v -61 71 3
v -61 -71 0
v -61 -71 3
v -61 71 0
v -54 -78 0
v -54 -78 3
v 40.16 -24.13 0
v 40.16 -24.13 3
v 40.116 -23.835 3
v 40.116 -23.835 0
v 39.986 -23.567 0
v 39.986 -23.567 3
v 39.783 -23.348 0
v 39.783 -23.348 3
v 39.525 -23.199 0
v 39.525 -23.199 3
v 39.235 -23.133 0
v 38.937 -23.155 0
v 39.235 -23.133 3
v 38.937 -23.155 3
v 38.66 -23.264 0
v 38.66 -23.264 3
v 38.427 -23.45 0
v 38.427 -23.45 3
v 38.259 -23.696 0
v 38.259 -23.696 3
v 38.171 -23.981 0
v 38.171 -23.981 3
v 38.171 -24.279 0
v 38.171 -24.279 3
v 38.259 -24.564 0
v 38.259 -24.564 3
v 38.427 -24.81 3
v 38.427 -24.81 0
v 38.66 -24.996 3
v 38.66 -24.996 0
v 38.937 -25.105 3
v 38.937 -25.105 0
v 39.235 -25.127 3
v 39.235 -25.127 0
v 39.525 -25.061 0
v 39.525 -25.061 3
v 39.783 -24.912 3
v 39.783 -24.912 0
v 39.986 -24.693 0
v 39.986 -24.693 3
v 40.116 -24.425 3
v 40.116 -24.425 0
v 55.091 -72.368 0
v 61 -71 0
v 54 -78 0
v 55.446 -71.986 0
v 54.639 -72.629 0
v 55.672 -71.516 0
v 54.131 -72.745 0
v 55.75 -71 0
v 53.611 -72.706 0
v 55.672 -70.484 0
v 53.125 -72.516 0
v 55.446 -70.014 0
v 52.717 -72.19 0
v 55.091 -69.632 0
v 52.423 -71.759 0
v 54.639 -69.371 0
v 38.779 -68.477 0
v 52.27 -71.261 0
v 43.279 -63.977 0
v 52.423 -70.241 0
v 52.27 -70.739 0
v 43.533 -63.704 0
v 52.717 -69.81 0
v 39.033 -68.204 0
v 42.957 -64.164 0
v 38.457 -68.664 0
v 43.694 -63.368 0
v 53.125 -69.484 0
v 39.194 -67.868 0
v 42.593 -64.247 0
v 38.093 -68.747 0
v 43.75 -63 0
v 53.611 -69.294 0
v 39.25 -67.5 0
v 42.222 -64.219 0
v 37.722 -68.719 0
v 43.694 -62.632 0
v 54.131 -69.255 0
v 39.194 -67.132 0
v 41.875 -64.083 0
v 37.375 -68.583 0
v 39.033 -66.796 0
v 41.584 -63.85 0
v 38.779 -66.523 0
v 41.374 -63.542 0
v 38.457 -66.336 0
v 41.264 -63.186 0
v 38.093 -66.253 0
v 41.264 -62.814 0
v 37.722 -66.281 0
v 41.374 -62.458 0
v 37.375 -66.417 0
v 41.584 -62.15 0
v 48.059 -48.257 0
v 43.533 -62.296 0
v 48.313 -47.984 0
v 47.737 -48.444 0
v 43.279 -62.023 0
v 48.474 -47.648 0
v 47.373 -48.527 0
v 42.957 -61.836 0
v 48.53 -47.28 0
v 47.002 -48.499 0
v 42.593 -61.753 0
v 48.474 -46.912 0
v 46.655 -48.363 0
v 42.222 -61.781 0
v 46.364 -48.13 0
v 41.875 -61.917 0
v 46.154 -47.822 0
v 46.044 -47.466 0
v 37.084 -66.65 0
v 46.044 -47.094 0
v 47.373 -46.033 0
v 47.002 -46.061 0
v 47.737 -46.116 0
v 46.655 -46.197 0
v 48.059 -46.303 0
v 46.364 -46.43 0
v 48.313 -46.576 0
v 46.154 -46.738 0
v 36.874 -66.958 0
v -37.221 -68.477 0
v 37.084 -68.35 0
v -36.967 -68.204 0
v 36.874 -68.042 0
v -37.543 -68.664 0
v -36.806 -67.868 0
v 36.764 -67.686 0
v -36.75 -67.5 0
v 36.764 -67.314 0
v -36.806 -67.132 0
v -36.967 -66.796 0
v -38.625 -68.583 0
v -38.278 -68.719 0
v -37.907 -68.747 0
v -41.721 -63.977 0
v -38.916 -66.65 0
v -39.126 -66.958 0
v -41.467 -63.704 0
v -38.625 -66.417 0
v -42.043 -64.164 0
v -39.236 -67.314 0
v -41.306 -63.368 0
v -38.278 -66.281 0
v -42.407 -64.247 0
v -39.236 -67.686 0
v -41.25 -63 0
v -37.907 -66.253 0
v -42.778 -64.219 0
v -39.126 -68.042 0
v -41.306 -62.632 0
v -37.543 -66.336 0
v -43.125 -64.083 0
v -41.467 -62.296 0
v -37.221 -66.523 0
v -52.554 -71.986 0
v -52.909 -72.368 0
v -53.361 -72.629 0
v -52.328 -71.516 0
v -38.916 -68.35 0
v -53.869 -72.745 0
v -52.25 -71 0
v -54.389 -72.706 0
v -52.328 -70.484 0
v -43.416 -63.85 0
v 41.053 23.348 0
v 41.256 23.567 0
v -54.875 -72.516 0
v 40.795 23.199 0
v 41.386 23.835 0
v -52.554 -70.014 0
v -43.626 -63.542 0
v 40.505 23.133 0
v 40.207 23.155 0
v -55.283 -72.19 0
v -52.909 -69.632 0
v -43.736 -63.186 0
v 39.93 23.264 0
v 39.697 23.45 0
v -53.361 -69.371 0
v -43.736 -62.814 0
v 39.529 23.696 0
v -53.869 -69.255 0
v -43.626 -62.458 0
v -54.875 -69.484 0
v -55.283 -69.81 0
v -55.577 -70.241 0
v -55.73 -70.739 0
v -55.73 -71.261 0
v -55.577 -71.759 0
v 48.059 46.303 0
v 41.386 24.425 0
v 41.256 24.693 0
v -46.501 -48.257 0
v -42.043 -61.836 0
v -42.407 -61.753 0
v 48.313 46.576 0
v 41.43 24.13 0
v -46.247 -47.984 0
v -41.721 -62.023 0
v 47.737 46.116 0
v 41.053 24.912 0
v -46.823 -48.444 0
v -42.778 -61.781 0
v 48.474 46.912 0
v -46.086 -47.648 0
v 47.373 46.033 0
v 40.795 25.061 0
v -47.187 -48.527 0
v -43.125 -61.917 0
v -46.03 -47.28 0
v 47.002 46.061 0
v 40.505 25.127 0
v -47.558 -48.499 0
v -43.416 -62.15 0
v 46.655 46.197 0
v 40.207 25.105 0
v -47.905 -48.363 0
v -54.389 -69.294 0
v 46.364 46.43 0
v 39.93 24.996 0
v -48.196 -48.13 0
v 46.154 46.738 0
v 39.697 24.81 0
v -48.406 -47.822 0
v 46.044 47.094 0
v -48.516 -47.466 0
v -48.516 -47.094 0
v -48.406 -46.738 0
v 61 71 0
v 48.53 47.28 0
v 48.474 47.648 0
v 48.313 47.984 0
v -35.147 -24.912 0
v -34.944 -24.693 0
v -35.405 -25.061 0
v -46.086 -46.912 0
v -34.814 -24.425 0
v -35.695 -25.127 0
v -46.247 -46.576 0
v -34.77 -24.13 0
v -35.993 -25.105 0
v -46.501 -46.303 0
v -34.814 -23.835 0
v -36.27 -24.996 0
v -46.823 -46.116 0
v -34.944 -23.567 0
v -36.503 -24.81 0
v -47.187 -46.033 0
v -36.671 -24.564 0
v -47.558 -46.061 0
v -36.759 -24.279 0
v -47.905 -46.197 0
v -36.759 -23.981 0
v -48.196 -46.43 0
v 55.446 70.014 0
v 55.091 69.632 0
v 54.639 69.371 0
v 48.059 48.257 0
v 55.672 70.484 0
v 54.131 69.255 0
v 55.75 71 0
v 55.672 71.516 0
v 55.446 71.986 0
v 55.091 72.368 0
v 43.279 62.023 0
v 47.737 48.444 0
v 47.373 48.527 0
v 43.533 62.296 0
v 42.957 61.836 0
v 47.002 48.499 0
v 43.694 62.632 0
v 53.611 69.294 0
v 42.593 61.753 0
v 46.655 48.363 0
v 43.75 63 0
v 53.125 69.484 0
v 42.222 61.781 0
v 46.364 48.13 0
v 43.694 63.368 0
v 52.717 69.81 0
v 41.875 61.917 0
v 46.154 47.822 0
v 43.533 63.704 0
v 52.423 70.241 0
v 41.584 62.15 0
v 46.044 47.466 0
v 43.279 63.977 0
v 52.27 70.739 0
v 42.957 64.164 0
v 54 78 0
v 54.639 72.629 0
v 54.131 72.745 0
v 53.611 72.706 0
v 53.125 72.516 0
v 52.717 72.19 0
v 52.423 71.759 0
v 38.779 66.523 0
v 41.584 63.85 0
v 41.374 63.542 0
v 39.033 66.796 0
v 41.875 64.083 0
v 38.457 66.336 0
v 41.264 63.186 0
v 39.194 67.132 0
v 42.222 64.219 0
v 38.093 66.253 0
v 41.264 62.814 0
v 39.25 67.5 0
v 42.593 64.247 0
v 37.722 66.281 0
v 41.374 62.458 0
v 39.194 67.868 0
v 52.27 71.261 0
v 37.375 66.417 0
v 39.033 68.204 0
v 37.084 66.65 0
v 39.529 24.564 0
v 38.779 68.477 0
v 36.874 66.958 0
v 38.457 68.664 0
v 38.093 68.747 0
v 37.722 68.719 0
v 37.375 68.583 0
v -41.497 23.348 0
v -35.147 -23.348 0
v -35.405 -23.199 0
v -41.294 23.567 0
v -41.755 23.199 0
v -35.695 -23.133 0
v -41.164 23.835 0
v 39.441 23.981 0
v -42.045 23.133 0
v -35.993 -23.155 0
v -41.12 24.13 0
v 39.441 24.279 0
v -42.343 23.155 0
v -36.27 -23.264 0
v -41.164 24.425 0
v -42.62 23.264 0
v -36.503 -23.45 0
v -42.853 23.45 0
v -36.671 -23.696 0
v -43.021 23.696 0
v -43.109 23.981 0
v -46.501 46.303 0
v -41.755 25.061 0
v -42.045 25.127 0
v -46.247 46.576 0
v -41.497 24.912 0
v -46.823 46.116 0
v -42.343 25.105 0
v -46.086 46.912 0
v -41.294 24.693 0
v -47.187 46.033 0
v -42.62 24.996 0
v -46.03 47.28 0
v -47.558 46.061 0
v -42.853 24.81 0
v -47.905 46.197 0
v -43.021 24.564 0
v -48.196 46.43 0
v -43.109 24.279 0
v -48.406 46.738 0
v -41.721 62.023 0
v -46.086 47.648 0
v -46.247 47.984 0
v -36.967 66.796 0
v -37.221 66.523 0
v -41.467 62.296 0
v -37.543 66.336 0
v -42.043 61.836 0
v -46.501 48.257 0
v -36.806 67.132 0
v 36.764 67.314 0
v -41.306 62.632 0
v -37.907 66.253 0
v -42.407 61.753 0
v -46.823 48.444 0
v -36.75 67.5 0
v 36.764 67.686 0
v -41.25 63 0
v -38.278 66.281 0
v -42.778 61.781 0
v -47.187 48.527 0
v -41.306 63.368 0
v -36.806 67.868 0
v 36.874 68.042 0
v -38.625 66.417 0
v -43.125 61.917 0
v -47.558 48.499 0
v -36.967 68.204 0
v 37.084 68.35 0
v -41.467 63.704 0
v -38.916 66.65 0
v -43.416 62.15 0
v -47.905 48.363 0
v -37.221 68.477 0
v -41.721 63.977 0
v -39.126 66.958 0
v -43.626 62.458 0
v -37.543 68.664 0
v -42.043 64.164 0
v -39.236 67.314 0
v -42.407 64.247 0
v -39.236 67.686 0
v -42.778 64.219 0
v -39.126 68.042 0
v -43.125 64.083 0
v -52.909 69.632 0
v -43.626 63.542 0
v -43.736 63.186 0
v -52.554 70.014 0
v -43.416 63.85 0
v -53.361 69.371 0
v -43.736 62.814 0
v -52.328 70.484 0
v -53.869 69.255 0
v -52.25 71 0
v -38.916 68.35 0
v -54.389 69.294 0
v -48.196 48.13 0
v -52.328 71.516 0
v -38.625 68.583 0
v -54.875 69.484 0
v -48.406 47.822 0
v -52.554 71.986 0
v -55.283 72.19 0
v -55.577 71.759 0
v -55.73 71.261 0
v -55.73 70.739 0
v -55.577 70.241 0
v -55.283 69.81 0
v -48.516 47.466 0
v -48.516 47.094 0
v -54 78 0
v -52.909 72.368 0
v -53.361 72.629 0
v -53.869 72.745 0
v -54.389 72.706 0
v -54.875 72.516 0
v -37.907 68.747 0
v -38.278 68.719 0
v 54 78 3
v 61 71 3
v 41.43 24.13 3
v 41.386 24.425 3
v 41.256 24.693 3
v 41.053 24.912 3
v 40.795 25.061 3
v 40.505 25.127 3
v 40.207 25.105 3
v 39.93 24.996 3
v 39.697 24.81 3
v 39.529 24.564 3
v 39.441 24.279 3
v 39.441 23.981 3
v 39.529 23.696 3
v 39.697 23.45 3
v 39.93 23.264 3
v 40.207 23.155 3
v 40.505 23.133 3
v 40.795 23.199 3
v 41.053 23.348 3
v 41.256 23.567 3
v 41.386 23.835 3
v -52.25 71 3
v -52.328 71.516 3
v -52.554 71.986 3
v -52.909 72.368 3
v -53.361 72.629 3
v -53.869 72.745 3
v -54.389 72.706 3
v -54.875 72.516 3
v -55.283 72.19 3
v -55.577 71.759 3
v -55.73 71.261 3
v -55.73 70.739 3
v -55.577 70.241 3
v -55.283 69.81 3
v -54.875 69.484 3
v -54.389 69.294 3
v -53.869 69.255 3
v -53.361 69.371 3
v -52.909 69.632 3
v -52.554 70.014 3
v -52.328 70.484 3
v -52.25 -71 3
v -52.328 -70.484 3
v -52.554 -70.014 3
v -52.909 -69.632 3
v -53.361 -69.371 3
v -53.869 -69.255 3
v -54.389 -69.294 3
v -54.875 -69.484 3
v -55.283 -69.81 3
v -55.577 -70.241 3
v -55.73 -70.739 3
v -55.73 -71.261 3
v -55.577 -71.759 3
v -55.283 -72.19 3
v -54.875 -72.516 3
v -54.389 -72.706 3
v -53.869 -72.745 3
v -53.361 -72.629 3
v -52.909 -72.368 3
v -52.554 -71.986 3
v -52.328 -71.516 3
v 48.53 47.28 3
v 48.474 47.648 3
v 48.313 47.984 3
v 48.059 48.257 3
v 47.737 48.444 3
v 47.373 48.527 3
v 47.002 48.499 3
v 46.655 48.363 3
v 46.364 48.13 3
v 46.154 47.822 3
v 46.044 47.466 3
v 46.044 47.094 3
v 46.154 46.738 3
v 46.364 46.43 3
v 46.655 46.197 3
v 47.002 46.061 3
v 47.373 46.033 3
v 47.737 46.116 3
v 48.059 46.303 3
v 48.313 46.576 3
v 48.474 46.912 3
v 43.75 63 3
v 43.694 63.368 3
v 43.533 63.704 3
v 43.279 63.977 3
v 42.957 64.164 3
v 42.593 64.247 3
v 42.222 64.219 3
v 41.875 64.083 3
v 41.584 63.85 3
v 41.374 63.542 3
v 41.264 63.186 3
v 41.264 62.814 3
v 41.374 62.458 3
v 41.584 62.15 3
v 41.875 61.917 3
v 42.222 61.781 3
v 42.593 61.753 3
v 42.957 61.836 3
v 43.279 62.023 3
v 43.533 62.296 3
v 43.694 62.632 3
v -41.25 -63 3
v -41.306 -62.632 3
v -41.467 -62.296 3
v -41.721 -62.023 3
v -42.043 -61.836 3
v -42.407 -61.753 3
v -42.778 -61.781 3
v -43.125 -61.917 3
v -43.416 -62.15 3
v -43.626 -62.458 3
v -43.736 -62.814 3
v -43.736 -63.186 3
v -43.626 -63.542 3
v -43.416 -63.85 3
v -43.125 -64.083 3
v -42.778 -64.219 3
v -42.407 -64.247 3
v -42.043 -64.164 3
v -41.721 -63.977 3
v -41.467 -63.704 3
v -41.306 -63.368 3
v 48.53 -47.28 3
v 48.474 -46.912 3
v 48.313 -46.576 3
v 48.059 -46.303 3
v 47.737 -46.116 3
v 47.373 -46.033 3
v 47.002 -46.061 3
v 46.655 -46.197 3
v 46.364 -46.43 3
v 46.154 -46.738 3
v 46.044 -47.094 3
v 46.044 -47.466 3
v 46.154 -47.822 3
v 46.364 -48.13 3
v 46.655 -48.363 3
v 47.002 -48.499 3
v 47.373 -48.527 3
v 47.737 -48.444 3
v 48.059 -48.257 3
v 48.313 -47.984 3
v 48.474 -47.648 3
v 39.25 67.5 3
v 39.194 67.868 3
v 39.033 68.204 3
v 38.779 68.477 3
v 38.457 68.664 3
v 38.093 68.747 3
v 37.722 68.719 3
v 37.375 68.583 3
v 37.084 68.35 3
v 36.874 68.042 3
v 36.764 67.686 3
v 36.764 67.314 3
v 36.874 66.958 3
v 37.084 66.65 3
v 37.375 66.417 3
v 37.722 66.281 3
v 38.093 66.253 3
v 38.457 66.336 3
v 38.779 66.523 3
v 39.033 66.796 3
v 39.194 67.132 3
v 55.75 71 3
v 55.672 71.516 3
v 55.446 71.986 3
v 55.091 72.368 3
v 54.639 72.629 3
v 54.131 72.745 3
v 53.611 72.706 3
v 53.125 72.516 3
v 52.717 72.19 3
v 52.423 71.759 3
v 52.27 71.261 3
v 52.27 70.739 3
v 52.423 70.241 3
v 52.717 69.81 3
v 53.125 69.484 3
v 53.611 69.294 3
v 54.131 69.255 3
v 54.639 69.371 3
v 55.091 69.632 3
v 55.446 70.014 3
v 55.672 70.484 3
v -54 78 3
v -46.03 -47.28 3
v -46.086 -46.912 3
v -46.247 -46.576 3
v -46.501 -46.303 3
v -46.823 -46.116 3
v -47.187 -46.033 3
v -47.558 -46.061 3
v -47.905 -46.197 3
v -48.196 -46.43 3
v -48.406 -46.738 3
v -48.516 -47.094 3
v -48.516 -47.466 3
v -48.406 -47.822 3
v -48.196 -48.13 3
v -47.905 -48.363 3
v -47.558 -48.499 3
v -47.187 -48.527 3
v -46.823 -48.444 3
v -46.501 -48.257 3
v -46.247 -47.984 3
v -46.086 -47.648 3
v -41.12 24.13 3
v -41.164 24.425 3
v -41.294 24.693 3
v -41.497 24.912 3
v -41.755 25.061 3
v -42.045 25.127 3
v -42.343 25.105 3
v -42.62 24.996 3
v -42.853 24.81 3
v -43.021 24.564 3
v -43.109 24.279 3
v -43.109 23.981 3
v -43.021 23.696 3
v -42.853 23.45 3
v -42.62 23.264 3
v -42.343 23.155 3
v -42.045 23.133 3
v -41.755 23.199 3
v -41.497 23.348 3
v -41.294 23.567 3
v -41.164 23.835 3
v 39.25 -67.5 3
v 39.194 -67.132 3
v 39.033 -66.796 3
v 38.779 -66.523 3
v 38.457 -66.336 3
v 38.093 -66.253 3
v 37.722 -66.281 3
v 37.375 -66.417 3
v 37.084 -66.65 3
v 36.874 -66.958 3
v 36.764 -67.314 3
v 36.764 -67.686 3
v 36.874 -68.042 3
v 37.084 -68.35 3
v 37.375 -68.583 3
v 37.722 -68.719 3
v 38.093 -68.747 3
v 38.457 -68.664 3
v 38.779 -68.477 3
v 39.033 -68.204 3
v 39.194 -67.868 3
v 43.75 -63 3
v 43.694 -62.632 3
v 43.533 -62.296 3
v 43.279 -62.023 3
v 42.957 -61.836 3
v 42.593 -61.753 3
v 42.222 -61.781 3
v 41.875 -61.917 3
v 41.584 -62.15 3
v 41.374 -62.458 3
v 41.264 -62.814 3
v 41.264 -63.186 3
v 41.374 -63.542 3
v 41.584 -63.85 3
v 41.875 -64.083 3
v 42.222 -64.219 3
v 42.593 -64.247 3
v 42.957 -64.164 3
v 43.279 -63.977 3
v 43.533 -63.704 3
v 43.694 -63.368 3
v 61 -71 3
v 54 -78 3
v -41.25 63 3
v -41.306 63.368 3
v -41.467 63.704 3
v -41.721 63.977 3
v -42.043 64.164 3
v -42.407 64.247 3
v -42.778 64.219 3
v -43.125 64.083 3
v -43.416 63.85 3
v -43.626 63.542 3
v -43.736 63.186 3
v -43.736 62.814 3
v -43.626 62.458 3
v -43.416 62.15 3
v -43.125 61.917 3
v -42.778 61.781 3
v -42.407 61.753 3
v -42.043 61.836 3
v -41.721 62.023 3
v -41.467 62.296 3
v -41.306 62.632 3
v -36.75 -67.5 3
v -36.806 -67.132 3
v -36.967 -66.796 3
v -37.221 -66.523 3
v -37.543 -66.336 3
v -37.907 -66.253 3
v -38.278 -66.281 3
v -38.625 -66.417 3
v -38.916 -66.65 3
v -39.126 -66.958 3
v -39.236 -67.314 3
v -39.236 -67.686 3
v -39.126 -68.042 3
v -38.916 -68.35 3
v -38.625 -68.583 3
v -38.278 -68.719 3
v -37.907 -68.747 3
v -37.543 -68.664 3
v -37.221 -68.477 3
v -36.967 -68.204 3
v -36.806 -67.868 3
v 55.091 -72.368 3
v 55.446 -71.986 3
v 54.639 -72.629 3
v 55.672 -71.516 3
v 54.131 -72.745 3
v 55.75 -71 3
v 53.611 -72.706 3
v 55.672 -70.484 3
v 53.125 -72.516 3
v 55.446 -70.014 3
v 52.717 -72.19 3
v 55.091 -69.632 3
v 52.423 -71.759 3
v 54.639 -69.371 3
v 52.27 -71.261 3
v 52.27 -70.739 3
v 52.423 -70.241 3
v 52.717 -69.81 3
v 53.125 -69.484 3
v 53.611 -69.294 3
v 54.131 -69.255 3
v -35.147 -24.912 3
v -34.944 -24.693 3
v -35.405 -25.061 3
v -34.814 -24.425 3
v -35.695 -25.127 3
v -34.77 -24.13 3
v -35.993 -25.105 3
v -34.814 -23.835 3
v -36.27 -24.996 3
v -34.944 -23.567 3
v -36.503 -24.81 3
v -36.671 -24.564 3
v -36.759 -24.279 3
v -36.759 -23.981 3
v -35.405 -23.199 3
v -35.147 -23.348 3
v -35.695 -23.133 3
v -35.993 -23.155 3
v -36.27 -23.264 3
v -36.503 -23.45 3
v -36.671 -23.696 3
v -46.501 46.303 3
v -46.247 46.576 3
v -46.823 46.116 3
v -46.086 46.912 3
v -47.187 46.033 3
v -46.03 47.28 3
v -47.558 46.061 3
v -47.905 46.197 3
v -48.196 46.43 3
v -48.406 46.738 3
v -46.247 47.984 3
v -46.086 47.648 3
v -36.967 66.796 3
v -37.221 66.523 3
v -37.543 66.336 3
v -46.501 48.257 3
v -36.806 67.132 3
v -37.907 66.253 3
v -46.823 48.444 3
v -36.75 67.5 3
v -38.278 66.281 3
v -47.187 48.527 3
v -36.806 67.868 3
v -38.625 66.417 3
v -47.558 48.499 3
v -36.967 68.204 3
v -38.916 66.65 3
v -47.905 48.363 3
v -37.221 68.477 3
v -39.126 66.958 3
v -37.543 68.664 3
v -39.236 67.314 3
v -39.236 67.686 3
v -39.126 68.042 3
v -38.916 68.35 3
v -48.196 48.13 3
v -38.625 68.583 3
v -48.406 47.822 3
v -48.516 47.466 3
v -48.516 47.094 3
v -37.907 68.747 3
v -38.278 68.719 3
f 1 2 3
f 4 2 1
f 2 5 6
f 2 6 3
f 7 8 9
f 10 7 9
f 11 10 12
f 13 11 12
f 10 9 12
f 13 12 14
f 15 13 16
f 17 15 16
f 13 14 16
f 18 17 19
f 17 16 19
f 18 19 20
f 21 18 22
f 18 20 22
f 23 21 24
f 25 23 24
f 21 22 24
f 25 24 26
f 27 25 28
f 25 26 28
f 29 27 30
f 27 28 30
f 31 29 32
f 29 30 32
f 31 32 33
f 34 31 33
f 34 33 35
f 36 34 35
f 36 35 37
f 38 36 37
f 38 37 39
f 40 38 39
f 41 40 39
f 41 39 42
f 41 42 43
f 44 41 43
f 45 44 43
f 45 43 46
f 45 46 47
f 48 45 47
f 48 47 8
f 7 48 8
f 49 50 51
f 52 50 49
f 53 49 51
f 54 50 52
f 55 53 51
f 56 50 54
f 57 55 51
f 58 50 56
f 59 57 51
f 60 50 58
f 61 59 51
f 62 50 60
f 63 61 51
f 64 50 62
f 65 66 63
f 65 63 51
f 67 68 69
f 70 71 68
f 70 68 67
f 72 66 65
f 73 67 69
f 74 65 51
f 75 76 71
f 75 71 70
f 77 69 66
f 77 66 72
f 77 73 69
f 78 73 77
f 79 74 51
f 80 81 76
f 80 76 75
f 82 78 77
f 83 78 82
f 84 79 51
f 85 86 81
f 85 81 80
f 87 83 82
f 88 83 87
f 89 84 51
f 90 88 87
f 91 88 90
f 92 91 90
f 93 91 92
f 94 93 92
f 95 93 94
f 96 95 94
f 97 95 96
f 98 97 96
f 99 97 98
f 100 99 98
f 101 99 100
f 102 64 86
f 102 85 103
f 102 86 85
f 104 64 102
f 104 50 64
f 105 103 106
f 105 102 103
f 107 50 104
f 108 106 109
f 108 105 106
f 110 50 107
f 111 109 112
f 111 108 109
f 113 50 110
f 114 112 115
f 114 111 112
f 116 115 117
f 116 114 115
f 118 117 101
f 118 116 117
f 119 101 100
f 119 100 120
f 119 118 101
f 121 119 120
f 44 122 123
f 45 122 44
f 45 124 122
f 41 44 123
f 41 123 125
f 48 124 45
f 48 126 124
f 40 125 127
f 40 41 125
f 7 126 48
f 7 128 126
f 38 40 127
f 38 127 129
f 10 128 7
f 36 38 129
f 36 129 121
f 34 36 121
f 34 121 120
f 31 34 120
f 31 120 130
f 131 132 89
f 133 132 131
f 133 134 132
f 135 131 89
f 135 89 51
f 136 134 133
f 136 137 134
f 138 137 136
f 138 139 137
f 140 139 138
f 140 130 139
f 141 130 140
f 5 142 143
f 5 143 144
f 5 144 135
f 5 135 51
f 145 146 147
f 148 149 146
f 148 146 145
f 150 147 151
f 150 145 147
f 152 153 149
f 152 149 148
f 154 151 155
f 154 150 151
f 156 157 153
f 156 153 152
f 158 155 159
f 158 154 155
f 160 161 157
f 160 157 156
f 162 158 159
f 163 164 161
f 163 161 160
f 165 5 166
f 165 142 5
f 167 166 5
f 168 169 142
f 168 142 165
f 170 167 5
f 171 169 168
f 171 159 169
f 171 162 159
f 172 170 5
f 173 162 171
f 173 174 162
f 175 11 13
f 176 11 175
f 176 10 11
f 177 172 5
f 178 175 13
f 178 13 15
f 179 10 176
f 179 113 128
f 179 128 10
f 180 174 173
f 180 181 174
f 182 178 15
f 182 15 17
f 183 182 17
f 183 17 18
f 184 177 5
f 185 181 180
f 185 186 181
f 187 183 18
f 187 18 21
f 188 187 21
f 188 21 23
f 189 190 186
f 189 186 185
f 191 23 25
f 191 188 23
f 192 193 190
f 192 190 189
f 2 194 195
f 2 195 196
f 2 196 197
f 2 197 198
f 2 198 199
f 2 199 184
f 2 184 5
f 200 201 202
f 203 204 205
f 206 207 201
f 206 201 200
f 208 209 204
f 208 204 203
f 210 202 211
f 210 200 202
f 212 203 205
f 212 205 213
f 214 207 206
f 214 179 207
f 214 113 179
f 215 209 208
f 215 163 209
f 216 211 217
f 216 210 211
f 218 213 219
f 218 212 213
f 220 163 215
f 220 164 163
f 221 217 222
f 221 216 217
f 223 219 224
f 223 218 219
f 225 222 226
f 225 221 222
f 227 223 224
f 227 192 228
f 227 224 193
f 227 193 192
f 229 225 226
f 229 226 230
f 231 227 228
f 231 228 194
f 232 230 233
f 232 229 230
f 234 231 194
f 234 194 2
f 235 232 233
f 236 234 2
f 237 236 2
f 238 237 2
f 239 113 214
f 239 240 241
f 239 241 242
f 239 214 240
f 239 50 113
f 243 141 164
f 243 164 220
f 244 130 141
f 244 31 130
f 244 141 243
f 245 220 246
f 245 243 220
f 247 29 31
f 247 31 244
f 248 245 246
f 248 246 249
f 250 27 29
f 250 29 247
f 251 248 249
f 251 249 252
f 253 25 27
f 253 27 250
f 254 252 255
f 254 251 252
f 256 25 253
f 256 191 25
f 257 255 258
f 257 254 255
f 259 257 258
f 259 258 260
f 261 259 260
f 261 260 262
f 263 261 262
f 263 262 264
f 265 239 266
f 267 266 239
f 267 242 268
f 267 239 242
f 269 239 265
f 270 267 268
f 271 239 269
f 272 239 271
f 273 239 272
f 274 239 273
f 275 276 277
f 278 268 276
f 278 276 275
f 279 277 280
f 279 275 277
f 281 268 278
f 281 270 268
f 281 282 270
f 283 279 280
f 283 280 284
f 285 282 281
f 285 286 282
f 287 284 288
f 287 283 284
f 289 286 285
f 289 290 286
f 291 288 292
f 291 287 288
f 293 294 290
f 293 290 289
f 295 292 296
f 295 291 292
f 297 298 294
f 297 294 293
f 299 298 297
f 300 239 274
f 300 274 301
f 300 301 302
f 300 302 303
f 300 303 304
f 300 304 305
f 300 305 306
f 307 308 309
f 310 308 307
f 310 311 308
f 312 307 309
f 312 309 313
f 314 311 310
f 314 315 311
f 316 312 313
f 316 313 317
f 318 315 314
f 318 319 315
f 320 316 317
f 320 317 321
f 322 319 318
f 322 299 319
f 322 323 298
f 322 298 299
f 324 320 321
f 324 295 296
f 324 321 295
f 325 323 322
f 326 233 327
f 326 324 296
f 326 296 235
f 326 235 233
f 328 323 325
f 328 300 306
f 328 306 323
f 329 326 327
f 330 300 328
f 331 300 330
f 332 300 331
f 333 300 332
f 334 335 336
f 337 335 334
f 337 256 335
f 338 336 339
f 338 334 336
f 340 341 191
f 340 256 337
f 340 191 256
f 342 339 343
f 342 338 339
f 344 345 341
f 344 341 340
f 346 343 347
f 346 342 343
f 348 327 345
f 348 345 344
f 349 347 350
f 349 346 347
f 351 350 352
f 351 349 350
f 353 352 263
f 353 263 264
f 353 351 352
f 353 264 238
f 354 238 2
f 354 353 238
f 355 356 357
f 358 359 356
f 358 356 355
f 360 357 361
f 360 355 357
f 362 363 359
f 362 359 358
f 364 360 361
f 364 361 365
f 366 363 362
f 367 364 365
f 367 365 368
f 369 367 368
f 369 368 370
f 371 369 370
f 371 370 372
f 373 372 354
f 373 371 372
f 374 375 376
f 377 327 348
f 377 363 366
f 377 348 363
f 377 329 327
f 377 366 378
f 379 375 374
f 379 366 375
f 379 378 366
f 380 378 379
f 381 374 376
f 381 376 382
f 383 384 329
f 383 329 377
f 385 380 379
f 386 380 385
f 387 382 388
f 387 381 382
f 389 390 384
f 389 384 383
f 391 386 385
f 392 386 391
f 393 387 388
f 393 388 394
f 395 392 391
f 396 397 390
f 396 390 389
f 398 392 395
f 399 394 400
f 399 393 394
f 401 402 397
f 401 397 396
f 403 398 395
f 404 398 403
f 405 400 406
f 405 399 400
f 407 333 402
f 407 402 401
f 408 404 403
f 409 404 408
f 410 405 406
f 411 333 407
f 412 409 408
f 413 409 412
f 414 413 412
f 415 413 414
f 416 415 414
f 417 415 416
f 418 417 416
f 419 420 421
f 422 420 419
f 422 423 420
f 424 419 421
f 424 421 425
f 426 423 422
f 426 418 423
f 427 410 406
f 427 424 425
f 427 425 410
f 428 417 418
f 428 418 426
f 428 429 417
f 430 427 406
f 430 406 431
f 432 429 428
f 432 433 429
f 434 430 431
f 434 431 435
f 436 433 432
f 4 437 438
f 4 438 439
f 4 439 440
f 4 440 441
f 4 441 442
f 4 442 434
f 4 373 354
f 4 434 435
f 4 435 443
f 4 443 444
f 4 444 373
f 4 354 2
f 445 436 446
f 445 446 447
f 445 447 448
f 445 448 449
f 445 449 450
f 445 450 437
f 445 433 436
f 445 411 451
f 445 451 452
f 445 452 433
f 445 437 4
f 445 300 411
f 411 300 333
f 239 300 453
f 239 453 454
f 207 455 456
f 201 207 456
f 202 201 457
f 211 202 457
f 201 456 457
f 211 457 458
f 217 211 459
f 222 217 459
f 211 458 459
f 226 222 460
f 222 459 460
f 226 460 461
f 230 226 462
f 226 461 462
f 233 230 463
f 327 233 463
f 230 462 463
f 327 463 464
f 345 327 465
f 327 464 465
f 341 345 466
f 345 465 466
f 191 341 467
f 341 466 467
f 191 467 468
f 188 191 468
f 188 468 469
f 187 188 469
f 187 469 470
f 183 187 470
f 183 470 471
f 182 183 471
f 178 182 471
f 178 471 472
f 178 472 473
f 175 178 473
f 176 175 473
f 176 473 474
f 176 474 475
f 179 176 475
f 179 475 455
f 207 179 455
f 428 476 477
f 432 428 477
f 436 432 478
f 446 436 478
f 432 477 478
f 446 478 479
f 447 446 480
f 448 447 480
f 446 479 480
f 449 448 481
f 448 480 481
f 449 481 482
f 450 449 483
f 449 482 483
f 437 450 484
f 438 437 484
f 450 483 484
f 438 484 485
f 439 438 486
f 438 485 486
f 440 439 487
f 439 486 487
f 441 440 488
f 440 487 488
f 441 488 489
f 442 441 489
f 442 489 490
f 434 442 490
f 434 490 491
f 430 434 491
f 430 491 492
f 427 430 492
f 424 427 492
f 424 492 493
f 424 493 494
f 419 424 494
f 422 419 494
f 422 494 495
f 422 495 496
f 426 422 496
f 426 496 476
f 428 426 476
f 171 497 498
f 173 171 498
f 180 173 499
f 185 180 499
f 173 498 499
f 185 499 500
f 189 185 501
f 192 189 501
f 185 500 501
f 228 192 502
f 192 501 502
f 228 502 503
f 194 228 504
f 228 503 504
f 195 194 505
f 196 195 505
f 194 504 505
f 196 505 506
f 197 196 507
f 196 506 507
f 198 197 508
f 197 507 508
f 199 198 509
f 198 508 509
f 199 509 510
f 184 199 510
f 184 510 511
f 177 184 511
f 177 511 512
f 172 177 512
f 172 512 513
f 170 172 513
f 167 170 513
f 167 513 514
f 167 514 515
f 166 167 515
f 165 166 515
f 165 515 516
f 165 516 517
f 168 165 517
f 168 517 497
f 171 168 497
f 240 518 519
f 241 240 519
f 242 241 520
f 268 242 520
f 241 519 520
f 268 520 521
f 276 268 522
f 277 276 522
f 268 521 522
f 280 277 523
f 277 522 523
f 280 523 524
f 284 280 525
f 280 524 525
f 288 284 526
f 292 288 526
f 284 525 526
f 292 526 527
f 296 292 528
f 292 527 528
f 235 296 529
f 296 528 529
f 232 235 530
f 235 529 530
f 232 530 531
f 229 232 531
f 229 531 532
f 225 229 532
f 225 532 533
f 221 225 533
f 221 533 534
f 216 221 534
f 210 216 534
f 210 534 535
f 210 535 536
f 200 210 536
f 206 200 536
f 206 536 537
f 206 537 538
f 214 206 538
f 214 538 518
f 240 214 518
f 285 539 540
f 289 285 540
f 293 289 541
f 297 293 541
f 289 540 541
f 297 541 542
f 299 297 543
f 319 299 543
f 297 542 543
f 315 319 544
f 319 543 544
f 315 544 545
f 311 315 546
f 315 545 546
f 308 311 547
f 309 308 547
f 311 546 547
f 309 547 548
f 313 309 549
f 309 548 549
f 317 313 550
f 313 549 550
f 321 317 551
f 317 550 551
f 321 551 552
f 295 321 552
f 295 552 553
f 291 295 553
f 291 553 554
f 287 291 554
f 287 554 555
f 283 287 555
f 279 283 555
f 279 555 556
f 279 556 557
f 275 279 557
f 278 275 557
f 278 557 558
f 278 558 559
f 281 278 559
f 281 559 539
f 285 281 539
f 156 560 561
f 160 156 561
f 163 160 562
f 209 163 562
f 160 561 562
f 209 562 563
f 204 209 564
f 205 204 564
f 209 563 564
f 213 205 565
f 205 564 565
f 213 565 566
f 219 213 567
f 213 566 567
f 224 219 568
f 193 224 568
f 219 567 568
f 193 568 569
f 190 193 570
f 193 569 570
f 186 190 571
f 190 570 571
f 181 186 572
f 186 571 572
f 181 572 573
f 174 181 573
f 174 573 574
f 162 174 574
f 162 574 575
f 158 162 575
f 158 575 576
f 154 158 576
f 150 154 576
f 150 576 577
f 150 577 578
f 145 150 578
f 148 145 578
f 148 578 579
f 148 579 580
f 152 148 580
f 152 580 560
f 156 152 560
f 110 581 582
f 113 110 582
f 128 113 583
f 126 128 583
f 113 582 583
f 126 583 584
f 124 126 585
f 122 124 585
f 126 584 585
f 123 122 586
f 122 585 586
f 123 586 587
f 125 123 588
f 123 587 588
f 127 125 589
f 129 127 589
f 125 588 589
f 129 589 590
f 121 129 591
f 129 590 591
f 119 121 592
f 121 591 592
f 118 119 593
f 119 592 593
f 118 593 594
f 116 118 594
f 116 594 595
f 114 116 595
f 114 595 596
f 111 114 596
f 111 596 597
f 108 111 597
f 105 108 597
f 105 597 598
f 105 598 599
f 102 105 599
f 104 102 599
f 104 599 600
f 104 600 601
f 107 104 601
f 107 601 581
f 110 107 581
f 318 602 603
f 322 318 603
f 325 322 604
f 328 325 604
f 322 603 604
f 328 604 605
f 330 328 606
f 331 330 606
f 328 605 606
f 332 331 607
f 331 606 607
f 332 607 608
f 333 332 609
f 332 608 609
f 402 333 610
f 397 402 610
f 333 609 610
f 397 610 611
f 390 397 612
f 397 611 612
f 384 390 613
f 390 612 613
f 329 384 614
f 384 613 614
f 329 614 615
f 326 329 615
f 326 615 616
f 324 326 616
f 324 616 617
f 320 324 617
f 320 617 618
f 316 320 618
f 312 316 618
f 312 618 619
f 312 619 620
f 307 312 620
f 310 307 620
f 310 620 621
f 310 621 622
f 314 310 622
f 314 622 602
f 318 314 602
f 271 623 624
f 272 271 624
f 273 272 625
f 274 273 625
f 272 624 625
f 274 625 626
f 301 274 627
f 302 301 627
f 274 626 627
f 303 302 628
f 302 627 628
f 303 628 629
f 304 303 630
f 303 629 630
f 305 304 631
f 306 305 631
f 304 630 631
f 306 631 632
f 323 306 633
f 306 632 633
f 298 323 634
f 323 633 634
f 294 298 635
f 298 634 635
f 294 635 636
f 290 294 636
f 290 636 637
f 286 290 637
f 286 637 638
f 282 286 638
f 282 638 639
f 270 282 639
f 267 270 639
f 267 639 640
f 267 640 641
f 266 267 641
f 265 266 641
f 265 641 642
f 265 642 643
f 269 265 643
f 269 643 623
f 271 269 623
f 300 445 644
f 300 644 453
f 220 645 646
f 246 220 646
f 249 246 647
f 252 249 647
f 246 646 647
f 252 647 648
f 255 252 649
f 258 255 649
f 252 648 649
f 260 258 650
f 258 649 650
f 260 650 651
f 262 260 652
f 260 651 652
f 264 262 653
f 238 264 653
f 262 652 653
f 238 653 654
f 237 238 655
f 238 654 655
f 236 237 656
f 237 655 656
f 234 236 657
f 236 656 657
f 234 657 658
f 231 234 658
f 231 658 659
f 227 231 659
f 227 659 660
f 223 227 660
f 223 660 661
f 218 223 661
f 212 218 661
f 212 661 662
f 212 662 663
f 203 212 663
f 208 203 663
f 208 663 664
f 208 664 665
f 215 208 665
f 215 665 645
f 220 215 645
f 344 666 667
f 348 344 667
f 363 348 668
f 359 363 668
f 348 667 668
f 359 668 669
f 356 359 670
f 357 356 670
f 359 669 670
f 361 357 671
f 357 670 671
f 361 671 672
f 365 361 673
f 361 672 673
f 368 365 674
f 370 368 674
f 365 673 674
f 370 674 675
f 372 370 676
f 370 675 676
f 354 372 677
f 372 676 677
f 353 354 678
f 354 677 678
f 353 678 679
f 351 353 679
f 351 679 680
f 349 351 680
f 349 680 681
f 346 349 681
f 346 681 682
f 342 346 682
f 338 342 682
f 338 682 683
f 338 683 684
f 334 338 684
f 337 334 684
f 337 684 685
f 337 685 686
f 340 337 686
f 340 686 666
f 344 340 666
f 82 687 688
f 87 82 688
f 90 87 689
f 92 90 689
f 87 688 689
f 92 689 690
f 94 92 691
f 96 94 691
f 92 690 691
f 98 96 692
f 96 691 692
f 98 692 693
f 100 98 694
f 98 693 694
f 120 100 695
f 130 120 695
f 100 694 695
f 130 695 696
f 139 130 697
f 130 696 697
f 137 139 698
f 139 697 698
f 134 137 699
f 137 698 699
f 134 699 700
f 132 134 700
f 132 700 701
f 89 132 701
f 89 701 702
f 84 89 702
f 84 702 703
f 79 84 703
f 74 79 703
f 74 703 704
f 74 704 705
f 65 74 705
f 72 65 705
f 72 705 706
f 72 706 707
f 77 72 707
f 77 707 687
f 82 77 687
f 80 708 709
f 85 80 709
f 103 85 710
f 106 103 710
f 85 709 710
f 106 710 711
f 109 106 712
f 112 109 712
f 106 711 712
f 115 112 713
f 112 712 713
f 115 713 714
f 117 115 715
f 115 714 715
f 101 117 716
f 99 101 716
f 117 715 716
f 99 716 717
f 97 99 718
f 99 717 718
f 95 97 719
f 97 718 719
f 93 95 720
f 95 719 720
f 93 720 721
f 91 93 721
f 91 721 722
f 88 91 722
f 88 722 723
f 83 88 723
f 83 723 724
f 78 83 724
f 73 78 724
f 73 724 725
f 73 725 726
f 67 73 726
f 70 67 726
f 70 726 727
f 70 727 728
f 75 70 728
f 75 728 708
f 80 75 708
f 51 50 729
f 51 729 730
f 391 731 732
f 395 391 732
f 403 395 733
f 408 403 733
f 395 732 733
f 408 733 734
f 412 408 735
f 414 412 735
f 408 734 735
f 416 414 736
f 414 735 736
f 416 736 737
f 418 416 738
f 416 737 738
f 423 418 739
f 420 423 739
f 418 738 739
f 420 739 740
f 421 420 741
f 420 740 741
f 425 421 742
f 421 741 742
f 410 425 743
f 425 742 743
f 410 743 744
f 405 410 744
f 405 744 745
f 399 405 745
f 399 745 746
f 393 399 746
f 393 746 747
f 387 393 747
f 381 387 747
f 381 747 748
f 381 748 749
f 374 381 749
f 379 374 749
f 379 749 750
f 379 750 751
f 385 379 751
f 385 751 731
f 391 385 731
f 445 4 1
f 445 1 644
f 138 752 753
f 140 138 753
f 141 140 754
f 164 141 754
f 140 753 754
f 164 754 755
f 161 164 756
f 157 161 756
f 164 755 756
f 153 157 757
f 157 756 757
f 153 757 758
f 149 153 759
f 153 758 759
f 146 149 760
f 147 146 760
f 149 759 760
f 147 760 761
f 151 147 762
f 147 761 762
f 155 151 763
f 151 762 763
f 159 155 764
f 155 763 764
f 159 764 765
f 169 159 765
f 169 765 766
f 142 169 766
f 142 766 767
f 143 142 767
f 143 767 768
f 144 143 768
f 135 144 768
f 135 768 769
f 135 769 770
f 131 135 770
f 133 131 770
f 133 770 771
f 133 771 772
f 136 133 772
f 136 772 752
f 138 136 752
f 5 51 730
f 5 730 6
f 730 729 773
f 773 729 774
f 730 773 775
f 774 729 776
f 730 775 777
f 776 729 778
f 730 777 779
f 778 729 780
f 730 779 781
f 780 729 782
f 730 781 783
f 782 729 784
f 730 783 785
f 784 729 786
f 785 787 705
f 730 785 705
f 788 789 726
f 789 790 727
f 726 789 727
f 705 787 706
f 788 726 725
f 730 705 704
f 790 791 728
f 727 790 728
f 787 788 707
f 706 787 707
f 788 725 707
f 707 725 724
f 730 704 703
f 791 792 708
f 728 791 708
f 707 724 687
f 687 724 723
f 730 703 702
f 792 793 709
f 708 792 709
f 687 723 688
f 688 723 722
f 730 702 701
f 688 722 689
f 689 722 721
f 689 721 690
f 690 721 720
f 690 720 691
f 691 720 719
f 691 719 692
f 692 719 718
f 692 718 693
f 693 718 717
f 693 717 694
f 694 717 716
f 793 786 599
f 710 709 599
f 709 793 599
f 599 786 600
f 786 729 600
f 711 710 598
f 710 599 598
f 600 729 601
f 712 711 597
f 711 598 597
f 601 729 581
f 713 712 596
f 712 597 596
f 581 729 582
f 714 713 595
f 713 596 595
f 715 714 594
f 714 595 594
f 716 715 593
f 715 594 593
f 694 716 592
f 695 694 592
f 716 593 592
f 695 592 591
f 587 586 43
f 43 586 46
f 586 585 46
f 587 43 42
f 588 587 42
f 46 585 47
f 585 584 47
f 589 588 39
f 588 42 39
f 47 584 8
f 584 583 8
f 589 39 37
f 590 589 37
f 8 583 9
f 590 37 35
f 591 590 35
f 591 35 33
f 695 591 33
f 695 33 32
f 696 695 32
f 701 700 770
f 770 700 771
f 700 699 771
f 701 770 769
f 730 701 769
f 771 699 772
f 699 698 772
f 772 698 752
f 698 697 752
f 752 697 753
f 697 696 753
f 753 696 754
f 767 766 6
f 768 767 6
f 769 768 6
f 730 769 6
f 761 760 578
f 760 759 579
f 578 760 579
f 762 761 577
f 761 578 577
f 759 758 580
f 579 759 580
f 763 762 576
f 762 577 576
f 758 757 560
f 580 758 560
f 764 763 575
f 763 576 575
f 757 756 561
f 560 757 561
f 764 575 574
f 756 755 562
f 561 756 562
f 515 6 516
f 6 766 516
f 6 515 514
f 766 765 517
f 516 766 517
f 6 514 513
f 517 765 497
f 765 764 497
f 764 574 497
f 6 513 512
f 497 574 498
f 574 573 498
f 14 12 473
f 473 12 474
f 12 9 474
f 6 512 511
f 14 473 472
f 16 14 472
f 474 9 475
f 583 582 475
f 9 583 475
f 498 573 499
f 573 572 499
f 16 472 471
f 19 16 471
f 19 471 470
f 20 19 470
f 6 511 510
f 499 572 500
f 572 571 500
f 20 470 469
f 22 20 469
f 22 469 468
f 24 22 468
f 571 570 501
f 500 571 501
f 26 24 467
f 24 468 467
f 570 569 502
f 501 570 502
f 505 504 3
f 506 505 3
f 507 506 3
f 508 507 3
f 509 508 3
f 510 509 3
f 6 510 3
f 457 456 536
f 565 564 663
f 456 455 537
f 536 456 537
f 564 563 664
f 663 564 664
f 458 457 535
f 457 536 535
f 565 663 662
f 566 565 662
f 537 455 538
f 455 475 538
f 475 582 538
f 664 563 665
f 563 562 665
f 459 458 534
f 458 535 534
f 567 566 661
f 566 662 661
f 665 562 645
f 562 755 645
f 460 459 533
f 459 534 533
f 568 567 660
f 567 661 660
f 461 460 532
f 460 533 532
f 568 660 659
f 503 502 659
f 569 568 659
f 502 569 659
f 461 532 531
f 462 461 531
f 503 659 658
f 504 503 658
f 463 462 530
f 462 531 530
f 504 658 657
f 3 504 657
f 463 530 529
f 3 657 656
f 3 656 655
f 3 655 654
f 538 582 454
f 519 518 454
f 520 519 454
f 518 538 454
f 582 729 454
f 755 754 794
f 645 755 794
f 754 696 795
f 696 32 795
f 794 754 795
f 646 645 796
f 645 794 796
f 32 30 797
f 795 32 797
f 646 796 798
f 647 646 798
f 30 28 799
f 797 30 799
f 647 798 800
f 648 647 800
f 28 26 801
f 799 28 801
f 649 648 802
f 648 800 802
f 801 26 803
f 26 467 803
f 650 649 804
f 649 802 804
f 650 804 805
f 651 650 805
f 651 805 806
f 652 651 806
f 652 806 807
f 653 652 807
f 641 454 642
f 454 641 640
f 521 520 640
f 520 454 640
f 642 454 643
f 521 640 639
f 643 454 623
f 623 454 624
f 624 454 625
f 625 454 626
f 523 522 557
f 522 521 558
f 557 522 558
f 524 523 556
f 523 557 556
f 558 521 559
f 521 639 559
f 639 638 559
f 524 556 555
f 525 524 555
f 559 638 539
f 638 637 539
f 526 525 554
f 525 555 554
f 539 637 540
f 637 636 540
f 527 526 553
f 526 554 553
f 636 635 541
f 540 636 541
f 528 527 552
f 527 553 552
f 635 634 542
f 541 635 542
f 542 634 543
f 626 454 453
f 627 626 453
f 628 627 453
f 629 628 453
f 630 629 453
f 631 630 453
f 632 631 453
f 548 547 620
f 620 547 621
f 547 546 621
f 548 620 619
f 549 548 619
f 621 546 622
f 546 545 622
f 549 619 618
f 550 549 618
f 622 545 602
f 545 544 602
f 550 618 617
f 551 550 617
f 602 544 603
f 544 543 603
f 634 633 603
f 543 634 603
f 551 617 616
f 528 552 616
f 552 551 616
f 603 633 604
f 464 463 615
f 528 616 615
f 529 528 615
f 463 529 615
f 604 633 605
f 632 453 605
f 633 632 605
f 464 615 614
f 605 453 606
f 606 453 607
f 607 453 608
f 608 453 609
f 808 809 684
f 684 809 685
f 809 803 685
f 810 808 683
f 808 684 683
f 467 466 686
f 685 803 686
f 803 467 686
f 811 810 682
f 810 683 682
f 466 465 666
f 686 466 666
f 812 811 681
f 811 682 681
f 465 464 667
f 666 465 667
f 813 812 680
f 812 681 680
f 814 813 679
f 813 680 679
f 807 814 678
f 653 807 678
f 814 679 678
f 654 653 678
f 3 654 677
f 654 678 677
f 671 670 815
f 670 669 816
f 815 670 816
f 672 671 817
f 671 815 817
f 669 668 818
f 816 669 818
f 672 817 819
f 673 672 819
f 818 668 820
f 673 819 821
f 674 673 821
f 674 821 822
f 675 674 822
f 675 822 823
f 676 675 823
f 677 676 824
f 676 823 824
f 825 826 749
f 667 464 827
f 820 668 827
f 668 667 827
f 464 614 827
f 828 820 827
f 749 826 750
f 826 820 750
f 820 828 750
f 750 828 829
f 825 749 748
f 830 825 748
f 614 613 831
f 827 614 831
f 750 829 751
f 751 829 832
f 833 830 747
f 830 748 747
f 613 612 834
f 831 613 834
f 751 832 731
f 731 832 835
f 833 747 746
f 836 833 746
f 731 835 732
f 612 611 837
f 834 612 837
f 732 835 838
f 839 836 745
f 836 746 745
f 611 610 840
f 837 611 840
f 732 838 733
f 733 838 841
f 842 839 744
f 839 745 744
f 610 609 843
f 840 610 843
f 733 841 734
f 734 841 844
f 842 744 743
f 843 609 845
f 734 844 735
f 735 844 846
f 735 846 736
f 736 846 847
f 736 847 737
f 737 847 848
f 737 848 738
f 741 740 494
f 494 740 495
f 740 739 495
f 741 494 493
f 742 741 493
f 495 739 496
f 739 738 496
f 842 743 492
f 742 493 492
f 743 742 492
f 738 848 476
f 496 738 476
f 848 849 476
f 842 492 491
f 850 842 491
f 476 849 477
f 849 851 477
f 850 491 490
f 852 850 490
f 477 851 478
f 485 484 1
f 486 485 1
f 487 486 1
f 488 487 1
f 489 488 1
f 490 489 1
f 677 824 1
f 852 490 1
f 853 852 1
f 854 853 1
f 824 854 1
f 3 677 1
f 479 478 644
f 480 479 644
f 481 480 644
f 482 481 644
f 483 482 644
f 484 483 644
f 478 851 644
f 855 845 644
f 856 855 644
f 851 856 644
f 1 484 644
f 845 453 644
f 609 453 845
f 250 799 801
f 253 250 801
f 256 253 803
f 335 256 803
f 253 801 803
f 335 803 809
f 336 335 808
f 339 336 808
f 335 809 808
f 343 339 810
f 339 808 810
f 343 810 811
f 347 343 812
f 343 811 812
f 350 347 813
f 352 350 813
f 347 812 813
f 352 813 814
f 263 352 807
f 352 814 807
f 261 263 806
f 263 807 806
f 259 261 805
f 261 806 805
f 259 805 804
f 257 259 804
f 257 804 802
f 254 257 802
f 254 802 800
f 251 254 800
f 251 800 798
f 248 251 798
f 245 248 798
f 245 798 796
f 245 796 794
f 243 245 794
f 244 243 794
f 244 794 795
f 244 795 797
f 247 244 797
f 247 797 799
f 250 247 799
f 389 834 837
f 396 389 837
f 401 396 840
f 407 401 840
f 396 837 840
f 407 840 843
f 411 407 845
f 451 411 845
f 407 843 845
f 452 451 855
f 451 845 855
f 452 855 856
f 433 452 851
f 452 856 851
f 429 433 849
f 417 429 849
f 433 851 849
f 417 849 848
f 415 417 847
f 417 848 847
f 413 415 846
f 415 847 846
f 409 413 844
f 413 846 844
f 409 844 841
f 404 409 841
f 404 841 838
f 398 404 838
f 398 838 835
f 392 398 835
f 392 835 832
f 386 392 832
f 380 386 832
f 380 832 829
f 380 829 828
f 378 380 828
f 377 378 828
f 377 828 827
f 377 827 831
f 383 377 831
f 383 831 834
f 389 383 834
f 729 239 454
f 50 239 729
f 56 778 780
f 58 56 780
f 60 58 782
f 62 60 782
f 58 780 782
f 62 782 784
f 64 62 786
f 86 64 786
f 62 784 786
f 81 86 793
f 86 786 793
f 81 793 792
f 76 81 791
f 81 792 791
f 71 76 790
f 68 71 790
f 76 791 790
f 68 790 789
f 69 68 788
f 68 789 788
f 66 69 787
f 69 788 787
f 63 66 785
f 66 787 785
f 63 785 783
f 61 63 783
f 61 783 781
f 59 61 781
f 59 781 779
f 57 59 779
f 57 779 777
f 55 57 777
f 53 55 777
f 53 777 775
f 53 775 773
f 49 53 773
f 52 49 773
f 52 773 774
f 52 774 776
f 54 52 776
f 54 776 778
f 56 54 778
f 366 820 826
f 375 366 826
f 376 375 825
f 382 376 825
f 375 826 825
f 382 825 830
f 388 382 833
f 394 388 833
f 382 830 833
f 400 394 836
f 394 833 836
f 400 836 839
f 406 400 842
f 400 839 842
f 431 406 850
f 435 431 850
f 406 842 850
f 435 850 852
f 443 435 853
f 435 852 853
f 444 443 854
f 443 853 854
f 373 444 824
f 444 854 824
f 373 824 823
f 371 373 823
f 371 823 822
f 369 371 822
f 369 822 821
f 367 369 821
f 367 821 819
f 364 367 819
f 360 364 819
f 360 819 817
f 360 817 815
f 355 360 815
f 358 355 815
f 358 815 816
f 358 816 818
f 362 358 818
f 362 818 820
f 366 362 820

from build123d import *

# Parameters (mm, degrees)
PAD_DEPTH       = 3
SKETCH001_R     = 1.25
POCKET_DEPTH    = 3.001
SKETCH002_R     = 1.25
POCKET001_DEPTH = 3.001
SKETCH003_R     = 1
POCKET002_DEPTH = 3.001
SKETCH004_R     = 1.25
POCKET003_DEPTH = 3.001
SKETCH005_R     = 1.75
POCKET004_DEPTH = 3.001


with BuildPart() as part:
    # Sketch → Pad (new body)
    with BuildSketch(Plane.XY):
        Polygon((-61, 71), (-54, 78), (54, 78), (61, 71), (61, -71), (54, -78), (-54, -78), (-61, -71), align=None)
    extrude(amount=PAD_DEPTH)

    # Sketch001 (on Face10 of Pad) → Pocket (cut, through all)
    with BuildSketch(Plane.XY.offset(3)):
        with Locations((-42.5, 63)):
            Circle(SKETCH001_R)
        with Locations((42.5, 63)):
            Circle(SKETCH001_R)
        with Locations((-42.5, -63)):
            Circle(SKETCH001_R)
        with Locations((42.5, -63)):
            Circle(SKETCH001_R)
    extrude(amount=-POCKET_DEPTH, mode=Mode.SUBTRACT)

    # Sketch002 (on Face5 of Pocket) → Pocket001 (cut, through all)
    with BuildSketch(Plane.XY.offset(3)):
        with Locations((-38, 67.5)):
            Circle(SKETCH002_R)
        with Locations((38, 67.5)):
            Circle(SKETCH002_R)
        with Locations((38, -67.5)):
            Circle(SKETCH002_R)
        with Locations((-38, -67.5)):
            Circle(SKETCH002_R)
    extrude(amount=-POCKET001_DEPTH, mode=Mode.SUBTRACT)

    # Sketch003 (on Face5 of Pocket001) → Pocket002 (cut, through all)
    with BuildSketch(Plane.XY.offset(3)):
        with Locations((-42.12, 24.13)):
            Circle(SKETCH003_R)
        with Locations((-35.77, -24.13)):
            Circle(SKETCH003_R)
        with Locations((40.43, 24.13)):
            Circle(SKETCH003_R)
        with Locations((39.16, -24.13)):
            Circle(SKETCH003_R)
    extrude(amount=-POCKET002_DEPTH, mode=Mode.SUBTRACT)

    # Sketch004 (on Face5 of Pocket002) → Pocket003 (cut, through all)
    with BuildSketch(Plane.XY.offset(3)):
        with Locations((-47.28, 47.28)):
            Circle(SKETCH004_R)
        with Locations((47.28, 47.28)):
            Circle(SKETCH004_R)
        with Locations((-47.28, -47.28)):
            Circle(SKETCH004_R)
        with Locations((47.28, -47.28)):
            Circle(SKETCH004_R)
    extrude(amount=-POCKET003_DEPTH, mode=Mode.SUBTRACT)

    # Sketch005 (on Face5 of Pocket003) → Pocket004 (cut, through all)
    with BuildSketch(Plane.XY.offset(3)):
        with Locations((-54, 71)):
            Circle(SKETCH005_R)
        with Locations((54, 71)):
            Circle(SKETCH005_R)
        with Locations((-54, -71)):
            Circle(SKETCH005_R)
        with Locations((54, -71)):
            Circle(SKETCH005_R)
    extrude(amount=-POCKET004_DEPTH, mode=Mode.SUBTRACT)


solid = part.part
